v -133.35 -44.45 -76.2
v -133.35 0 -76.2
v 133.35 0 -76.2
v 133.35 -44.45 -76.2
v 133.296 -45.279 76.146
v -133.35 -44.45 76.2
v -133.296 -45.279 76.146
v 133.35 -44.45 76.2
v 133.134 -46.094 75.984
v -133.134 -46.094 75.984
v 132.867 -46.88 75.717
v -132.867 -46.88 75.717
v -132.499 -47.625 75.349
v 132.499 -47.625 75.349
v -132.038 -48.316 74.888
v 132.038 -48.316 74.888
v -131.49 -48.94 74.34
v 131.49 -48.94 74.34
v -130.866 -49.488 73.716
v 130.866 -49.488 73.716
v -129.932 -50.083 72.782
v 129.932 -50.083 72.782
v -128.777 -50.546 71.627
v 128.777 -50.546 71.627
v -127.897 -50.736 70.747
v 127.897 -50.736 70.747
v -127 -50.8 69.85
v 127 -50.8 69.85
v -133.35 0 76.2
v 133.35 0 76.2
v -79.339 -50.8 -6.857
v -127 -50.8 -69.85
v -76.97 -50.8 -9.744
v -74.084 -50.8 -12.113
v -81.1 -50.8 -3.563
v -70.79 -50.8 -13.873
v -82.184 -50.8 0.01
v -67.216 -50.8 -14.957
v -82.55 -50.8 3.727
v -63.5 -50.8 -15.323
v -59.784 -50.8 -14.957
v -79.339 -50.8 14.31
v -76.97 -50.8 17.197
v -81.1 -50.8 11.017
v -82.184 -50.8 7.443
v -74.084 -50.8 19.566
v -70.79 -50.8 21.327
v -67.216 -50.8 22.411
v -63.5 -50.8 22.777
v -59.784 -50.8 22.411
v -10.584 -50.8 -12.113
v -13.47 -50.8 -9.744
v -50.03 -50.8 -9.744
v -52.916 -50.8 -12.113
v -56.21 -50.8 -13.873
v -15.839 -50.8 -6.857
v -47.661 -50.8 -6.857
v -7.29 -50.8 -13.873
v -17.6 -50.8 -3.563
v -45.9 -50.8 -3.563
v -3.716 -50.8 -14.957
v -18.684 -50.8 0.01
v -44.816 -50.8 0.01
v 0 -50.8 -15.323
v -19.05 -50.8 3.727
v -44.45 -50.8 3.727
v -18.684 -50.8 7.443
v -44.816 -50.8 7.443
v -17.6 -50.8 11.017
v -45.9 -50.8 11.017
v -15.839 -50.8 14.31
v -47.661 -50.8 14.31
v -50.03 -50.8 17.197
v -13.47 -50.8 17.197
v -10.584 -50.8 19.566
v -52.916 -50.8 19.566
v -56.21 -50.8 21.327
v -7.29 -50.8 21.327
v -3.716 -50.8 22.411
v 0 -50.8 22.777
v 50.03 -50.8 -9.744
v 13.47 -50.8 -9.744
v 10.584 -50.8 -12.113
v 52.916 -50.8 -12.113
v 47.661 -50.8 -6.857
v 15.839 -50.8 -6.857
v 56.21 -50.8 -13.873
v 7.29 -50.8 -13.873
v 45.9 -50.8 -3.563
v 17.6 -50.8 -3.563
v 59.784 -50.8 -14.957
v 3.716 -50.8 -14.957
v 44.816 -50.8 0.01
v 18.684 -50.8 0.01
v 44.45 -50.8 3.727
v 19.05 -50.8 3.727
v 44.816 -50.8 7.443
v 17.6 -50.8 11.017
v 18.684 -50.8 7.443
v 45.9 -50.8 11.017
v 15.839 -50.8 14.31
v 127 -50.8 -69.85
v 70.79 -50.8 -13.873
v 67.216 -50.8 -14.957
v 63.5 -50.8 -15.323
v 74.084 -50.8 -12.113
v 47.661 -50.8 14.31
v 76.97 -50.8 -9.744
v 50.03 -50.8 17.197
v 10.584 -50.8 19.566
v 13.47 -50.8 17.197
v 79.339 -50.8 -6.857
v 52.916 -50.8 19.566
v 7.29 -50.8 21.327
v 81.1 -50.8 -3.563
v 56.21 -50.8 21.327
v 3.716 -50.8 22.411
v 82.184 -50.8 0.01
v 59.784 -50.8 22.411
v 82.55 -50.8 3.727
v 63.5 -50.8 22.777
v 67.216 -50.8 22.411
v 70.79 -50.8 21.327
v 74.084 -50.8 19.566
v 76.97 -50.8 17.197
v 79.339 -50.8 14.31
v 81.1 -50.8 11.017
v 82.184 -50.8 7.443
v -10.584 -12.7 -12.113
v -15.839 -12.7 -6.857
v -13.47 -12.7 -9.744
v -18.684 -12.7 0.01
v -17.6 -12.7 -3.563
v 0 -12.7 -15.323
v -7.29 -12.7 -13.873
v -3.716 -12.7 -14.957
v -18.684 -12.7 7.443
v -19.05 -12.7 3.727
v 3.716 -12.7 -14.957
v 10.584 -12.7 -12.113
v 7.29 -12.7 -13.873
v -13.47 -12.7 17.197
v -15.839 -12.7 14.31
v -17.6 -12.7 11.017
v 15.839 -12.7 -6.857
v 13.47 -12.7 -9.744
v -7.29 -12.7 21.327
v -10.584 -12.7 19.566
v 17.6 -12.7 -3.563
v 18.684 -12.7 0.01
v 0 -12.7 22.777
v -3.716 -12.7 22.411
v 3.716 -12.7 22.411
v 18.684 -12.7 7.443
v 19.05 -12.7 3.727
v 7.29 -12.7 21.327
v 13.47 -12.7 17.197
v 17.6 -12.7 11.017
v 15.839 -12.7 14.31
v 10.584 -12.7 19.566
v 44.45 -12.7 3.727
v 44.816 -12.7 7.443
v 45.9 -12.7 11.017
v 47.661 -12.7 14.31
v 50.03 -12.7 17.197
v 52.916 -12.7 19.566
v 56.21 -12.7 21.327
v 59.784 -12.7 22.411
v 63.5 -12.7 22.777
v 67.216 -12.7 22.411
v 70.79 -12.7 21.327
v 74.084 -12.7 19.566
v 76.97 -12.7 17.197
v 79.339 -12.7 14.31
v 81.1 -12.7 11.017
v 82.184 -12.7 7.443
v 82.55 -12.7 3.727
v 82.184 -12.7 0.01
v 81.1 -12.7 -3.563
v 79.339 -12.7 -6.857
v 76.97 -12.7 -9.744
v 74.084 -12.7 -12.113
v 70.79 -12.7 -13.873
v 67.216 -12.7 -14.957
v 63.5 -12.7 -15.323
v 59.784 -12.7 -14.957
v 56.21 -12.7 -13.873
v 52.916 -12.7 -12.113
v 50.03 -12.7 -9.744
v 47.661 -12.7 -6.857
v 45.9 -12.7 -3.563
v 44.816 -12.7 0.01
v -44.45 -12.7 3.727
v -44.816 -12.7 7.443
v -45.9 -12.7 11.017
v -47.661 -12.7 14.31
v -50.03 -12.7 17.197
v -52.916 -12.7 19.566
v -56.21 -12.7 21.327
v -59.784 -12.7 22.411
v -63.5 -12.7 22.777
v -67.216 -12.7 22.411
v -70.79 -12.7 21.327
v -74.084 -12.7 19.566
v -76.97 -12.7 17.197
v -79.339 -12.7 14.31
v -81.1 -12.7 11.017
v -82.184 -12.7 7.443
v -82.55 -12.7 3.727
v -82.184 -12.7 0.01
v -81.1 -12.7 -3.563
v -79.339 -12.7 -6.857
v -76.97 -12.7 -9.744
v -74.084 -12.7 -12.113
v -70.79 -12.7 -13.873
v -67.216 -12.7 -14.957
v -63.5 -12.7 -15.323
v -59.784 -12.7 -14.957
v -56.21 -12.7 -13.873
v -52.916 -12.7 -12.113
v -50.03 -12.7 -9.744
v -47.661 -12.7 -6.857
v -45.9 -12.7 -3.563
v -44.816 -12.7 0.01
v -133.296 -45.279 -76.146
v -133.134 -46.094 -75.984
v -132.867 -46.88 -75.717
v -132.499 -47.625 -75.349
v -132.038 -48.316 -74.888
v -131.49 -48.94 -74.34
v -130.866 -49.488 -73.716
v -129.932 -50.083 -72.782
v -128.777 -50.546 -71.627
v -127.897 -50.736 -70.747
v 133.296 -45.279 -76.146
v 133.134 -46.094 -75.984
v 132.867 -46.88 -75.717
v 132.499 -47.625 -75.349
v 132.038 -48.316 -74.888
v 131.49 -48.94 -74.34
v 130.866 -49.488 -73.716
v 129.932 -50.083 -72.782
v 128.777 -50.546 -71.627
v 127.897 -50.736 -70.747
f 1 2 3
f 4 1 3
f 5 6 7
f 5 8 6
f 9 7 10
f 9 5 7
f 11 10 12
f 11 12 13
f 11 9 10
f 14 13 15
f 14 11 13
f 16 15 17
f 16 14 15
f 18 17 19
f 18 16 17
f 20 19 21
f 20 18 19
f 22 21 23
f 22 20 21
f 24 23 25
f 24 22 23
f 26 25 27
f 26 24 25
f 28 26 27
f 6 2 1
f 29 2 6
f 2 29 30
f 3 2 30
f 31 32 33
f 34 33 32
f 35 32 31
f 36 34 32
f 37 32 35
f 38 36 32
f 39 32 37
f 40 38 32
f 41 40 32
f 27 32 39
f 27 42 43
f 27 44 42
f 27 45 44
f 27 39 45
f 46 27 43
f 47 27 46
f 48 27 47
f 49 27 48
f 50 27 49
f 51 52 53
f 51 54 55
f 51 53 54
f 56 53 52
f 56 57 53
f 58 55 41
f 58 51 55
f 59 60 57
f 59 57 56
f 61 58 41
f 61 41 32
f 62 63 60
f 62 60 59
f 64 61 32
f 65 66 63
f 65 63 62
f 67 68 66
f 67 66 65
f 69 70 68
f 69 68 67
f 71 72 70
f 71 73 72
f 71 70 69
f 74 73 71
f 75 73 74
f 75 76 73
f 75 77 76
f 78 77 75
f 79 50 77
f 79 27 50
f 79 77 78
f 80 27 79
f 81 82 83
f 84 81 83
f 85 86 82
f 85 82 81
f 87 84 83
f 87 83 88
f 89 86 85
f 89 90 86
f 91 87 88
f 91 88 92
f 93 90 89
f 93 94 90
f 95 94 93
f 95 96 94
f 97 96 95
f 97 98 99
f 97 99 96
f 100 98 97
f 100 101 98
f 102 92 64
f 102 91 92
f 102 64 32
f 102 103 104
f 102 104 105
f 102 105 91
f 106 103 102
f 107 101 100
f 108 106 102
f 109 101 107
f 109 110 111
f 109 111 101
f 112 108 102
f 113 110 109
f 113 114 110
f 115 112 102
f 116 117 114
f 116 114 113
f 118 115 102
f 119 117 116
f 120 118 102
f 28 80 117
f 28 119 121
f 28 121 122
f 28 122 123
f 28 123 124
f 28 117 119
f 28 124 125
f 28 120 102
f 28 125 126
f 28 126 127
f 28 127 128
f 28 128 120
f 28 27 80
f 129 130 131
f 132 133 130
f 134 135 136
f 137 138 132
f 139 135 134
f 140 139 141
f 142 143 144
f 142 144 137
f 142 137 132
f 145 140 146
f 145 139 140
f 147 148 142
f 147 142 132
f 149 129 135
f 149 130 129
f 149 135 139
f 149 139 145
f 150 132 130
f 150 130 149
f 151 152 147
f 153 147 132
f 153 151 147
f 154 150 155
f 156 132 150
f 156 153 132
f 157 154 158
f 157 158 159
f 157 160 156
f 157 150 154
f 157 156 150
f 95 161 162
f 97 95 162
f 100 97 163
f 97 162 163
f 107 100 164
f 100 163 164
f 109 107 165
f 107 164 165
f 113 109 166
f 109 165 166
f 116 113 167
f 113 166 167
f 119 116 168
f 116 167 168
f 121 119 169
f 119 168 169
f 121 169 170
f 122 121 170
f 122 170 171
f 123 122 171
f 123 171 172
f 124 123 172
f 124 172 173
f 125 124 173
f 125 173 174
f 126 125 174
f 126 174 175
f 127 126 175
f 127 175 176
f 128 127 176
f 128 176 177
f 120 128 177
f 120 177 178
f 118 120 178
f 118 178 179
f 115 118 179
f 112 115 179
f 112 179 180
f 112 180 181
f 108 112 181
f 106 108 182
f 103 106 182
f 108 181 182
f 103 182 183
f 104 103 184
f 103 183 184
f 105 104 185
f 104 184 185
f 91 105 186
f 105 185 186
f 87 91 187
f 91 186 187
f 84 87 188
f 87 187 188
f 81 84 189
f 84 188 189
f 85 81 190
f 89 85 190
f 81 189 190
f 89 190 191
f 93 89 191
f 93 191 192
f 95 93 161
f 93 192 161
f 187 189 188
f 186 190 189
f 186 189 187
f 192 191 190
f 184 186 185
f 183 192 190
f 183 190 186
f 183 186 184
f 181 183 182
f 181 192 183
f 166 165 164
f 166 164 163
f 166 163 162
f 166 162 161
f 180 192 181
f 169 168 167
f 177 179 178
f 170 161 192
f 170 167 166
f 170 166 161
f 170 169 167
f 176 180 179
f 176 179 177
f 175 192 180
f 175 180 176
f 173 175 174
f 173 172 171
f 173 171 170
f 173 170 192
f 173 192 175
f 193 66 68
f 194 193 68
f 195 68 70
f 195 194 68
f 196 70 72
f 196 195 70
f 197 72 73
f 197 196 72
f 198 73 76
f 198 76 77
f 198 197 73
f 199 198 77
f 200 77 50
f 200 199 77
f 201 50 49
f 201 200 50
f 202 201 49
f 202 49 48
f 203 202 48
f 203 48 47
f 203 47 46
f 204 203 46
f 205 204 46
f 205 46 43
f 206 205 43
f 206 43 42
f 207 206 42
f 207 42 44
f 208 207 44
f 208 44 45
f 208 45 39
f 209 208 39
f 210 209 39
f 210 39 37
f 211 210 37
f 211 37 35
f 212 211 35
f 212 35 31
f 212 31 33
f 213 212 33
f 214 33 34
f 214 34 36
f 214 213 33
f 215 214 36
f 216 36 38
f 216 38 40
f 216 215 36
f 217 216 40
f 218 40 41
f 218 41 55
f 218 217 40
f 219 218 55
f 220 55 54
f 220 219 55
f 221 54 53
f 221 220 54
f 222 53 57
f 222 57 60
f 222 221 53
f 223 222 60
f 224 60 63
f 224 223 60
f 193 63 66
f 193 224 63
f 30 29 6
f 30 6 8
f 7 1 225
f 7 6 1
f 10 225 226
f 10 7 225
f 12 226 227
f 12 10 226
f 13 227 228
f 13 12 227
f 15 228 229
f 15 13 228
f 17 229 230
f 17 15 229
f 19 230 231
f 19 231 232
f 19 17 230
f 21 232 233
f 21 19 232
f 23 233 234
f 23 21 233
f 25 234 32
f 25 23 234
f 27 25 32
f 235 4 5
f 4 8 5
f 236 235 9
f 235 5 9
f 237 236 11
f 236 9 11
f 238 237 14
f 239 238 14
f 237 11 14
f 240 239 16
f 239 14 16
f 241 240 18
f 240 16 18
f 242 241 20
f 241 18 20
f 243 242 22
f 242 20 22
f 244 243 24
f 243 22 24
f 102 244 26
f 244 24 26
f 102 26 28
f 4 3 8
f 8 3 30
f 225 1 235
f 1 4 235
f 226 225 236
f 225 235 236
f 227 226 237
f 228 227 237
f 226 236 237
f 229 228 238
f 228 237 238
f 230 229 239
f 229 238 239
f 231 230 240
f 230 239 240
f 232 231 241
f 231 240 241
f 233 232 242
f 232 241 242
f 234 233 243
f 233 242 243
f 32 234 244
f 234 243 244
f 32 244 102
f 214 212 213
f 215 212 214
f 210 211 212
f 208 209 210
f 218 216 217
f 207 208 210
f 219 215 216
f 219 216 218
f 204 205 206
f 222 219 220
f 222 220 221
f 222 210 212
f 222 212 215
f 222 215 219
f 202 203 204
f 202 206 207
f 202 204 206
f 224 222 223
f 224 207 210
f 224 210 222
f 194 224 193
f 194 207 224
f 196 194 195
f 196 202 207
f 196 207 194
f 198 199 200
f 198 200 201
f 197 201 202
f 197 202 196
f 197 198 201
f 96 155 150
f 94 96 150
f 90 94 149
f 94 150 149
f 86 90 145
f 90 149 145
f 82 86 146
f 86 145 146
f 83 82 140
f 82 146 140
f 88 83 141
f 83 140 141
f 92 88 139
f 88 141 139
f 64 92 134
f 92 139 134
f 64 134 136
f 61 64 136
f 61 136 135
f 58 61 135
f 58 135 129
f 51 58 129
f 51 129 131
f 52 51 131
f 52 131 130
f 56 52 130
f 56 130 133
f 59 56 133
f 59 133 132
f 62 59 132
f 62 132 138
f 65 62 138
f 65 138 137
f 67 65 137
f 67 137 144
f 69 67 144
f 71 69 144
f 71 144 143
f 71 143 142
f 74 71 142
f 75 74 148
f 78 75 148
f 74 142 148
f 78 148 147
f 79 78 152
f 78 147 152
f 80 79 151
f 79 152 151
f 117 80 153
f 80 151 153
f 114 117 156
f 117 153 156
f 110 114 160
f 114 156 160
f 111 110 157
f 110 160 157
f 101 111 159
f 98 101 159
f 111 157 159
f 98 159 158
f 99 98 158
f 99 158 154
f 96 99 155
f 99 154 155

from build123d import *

# Parameters (mm, degrees)
F0_W     = 266.7
F0_H     = 152.4
F0_R     = 19.05
F1_DEPTH = 50.8
F2_DEPTH = 12.7
F3_R     = 6.35


with BuildPart() as f1:
    # F0 (on Front) → F1 (new body)
    with BuildSketch(Plane.XZ):
        Rectangle(F0_W, F0_H)
        with Locations((-63.5, 3.7267601583)):
            Circle(F0_R, mode=Mode.SUBTRACT)
        with BuildLine():
            ThreePointArc((-19.05, 3.7267601583), (0, 22.7767601583), (19.05, 3.7267601583))
            ThreePointArc((19.05, 3.7267601583), (0, -15.3232398417), (-19.05, 3.7267601583))
        make_face(mode=Mode.SUBTRACT)
        with BuildLine():
            ThreePointArc((82.55, 3.7267601583), (63.5, -15.3232398417), (44.45, 3.7267601583))
            ThreePointArc((44.45, 3.7267601583), (63.5, 22.7767601583), (82.55, 3.7267601583))
        make_face(mode=Mode.SUBTRACT)
    extrude(amount=F1_DEPTH)

    # F0 (on Front) → F2 (join)
    with BuildSketch(Plane.XZ):
        with BuildLine():
            ThreePointArc((-19.05, 3.7267601583), (0, -15.3232398417), (19.05, 3.7267601583))
            ThreePointArc((19.05, 3.7267601583), (0, 22.7767601583), (-19.05, 3.7267601583))
        make_face()
        with Locations((-63.5, 3.7267601583)):
            Circle(F0_R)
        with BuildLine():
            ThreePointArc((82.55, 3.7267601583), (63.5, 22.7767601583), (44.45, 3.7267601583))
            ThreePointArc((44.45, 3.7267601583), (63.5, -15.3232398417), (82.55, 3.7267601583))
        make_face()
    extrude(amount=F2_DEPTH)

    # F3
    f3_edges = [f1.edges().sort_by_distance(p)[0] for p in [
        (-133.35, -50.8, 0),
        (0, -50.8, -76.2),
        (133.35, -50.8, 0),
        (0, -50.8, 76.2),
    ]]
    fillet(f3_edges, radius=F3_R)


solid = f1.part
